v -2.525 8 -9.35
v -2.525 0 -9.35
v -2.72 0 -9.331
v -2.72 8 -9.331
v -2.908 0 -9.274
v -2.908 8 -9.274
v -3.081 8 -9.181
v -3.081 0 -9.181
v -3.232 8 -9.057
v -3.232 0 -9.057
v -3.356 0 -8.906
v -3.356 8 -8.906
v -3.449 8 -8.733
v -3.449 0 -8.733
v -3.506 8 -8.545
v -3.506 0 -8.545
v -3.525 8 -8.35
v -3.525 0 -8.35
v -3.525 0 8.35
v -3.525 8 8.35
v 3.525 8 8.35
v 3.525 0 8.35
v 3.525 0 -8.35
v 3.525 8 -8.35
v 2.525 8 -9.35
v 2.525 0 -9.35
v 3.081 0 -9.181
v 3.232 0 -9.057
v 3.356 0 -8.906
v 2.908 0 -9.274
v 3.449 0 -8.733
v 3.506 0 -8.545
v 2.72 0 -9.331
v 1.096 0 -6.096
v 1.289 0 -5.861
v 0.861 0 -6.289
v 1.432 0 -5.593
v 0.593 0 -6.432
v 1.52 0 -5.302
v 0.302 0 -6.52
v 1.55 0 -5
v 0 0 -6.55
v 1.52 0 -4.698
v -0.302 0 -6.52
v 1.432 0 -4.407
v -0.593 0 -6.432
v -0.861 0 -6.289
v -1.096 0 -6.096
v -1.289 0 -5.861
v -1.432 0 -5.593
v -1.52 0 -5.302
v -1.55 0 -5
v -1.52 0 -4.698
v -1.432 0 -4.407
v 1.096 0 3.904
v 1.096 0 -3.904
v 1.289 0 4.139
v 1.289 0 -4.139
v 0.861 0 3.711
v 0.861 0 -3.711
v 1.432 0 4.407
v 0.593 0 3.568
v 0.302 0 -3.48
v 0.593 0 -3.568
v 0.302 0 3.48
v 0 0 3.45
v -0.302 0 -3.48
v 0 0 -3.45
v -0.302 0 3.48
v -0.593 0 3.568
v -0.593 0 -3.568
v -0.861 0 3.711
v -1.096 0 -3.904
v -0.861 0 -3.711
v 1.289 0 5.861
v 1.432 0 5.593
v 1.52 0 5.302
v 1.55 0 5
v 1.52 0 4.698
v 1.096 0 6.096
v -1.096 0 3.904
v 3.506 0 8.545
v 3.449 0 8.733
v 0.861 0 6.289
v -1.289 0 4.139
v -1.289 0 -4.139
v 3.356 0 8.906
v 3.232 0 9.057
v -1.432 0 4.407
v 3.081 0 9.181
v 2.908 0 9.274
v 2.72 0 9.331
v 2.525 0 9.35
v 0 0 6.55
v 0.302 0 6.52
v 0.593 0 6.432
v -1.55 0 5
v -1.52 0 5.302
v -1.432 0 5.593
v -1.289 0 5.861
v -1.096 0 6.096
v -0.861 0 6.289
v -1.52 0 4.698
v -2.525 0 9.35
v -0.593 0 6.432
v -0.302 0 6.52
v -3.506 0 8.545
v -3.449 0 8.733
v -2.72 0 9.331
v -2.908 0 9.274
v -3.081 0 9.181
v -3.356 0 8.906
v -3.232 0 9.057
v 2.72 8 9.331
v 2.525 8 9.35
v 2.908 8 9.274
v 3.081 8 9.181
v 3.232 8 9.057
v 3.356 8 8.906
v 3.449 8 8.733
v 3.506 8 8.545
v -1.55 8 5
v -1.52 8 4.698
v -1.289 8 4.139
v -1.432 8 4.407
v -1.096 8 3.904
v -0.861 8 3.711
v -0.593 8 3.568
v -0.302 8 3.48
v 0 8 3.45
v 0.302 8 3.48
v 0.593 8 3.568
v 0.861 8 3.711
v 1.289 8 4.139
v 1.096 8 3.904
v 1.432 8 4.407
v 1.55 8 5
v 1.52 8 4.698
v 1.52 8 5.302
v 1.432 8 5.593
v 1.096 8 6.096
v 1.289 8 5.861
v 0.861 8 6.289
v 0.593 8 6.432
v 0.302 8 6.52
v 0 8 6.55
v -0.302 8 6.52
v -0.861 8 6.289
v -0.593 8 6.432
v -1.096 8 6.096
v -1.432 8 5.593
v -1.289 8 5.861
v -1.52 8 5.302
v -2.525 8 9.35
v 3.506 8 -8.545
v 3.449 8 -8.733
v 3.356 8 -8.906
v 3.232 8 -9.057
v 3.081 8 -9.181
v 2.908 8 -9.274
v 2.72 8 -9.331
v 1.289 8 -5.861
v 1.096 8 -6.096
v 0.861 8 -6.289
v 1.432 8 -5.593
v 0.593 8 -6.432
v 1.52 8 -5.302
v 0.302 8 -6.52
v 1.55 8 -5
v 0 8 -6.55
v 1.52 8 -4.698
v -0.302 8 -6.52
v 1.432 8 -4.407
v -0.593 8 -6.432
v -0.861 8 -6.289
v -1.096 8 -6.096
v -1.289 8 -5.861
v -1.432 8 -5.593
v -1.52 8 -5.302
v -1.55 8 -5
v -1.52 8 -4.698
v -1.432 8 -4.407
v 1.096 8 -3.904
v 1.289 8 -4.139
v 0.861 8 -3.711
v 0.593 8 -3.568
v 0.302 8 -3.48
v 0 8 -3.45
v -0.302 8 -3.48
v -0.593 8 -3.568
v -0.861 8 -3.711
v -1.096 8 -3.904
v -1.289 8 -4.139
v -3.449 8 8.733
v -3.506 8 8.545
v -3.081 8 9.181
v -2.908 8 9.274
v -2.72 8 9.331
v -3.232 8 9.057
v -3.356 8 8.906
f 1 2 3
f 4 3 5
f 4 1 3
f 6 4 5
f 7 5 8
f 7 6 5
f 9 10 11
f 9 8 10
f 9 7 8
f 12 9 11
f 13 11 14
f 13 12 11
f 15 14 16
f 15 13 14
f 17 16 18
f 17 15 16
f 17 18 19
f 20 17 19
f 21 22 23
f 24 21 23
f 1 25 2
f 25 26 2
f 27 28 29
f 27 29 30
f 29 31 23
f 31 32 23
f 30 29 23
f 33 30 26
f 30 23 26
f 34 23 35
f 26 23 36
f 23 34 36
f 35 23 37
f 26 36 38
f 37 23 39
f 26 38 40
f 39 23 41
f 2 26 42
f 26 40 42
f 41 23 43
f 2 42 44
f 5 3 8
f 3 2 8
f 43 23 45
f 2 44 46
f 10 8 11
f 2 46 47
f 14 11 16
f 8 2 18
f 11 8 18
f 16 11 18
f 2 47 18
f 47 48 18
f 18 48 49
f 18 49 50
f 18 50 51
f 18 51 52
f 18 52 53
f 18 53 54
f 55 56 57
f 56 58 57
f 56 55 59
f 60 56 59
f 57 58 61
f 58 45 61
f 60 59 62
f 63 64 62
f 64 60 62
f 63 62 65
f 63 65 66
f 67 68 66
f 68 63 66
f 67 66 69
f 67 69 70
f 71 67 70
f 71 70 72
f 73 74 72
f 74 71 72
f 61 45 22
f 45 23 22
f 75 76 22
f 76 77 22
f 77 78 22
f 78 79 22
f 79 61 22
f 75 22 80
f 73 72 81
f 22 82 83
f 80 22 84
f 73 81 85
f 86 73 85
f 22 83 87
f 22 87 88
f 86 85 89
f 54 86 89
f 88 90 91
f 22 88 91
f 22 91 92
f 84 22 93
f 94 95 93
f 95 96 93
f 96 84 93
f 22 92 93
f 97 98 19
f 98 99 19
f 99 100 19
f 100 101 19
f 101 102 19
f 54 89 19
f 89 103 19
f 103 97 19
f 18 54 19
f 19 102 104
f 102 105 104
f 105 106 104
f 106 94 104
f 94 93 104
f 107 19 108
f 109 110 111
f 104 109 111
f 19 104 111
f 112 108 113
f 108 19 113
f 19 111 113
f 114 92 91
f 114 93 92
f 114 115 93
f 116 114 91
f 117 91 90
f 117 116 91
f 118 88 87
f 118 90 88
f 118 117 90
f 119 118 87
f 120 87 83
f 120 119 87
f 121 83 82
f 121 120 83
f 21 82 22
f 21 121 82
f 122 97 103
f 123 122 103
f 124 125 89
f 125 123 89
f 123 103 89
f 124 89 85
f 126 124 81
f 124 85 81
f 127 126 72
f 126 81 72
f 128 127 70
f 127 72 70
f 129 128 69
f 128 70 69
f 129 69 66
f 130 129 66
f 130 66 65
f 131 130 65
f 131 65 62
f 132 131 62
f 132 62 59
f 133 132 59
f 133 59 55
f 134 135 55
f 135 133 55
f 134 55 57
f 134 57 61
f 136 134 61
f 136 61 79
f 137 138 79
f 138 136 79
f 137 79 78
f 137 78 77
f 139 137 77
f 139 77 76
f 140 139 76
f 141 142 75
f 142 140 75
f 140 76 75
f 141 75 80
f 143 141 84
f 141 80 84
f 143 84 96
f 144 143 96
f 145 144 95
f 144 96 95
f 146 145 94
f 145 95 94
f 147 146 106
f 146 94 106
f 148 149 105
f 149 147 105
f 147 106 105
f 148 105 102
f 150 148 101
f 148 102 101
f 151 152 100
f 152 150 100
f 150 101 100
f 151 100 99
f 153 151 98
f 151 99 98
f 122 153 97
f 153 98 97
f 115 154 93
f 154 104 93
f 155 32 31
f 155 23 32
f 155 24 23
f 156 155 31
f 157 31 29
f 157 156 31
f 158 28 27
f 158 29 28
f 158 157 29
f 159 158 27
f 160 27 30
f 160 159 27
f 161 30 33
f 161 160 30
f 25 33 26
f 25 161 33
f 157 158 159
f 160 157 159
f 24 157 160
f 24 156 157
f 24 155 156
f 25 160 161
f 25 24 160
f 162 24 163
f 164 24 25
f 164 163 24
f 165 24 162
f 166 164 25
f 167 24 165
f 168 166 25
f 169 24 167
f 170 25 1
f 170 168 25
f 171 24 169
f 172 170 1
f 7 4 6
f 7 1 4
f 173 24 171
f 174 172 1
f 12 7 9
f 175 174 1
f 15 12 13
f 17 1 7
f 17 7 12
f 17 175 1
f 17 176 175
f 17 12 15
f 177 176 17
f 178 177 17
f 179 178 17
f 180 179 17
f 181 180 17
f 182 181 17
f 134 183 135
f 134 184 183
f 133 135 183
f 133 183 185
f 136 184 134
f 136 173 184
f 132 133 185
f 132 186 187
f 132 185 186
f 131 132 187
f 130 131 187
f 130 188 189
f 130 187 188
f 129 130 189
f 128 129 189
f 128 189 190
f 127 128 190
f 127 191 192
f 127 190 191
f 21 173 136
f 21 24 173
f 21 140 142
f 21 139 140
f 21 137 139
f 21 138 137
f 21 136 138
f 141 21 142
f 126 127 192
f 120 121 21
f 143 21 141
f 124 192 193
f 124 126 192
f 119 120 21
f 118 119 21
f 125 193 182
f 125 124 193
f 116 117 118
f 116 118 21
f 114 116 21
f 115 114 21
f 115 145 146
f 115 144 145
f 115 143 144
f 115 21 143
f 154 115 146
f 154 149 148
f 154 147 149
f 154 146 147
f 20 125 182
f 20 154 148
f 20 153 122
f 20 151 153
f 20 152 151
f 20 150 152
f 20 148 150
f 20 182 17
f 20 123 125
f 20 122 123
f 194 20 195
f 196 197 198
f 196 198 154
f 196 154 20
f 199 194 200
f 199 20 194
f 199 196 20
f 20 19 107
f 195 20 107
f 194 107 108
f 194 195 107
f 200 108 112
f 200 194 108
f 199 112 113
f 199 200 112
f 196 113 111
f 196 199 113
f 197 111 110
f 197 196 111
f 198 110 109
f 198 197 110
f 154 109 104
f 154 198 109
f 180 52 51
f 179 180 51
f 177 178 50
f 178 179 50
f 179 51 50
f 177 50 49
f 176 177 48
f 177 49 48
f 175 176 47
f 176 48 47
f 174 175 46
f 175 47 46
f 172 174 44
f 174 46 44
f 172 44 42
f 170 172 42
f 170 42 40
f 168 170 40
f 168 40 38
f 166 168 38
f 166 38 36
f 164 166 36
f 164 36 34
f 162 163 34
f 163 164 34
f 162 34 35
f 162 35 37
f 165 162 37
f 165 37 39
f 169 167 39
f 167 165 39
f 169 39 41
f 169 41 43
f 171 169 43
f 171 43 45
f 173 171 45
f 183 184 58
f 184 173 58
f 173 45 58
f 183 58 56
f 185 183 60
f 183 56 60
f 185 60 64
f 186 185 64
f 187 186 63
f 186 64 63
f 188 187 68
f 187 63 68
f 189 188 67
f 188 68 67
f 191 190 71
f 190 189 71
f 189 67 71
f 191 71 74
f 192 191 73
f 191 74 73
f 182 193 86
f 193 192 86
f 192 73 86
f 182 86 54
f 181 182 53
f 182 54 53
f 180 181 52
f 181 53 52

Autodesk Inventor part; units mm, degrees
ref_plane "YZ Plane" through (0, 0, 0) normal (1, 0, 0) x (0, 1, 0)
ref_plane "XZ Plane" through (0, 0, 0) normal (0, 1, 0) x (-1, 0, 0)
ref_plane "XY Plane" through (0, 0, 0) normal (0, 0, 1) x (1, 0, 0)
sketch "Эскиз1" plane through (0, 0, 0) normal (0, 1, 0) x (-1, 0, 0)
  circle A0 centre (0, -5) radius 1.55
  circle A1 centre (0, 5) radius 1.55
  line L0 (0, 5) -> (0, -5) construction
  line L1 (3.525, 9.35) -> (-3.525, 9.35)
  line L2 (-3.525, 9.35) -> (-3.525, -9.35)
  line L3 (-3.525, -9.35) -> (3.525, -9.35)
  line L4 (3.525, -9.35) -> (3.525, 9.35)
  line L5 (3.525, 9.35) -> (-3.525, -9.35) construction
  line L6 (-3.525, 9.35) -> (3.525, -9.35) construction
  point P0 (0, 0)
  point P1 (0, 0)
  dimension "d2" = 3.1
  dimension "d3" = 3.1
  dimension "d4" = 10
  dimension "d5" = 7.05
  dimension "d6" = 18.7
extrude "Выдавливание1" add sketch "Эскиз1" along normal blind 8
fillet "Сопряжение1" radius 1 4 edges at (-3.525, 4, 9.35) (3.525, 4, 9.35) (3.525, 4, -9.35) (-3.525, 4, -9.35)
properties part number "креп_сервы"
